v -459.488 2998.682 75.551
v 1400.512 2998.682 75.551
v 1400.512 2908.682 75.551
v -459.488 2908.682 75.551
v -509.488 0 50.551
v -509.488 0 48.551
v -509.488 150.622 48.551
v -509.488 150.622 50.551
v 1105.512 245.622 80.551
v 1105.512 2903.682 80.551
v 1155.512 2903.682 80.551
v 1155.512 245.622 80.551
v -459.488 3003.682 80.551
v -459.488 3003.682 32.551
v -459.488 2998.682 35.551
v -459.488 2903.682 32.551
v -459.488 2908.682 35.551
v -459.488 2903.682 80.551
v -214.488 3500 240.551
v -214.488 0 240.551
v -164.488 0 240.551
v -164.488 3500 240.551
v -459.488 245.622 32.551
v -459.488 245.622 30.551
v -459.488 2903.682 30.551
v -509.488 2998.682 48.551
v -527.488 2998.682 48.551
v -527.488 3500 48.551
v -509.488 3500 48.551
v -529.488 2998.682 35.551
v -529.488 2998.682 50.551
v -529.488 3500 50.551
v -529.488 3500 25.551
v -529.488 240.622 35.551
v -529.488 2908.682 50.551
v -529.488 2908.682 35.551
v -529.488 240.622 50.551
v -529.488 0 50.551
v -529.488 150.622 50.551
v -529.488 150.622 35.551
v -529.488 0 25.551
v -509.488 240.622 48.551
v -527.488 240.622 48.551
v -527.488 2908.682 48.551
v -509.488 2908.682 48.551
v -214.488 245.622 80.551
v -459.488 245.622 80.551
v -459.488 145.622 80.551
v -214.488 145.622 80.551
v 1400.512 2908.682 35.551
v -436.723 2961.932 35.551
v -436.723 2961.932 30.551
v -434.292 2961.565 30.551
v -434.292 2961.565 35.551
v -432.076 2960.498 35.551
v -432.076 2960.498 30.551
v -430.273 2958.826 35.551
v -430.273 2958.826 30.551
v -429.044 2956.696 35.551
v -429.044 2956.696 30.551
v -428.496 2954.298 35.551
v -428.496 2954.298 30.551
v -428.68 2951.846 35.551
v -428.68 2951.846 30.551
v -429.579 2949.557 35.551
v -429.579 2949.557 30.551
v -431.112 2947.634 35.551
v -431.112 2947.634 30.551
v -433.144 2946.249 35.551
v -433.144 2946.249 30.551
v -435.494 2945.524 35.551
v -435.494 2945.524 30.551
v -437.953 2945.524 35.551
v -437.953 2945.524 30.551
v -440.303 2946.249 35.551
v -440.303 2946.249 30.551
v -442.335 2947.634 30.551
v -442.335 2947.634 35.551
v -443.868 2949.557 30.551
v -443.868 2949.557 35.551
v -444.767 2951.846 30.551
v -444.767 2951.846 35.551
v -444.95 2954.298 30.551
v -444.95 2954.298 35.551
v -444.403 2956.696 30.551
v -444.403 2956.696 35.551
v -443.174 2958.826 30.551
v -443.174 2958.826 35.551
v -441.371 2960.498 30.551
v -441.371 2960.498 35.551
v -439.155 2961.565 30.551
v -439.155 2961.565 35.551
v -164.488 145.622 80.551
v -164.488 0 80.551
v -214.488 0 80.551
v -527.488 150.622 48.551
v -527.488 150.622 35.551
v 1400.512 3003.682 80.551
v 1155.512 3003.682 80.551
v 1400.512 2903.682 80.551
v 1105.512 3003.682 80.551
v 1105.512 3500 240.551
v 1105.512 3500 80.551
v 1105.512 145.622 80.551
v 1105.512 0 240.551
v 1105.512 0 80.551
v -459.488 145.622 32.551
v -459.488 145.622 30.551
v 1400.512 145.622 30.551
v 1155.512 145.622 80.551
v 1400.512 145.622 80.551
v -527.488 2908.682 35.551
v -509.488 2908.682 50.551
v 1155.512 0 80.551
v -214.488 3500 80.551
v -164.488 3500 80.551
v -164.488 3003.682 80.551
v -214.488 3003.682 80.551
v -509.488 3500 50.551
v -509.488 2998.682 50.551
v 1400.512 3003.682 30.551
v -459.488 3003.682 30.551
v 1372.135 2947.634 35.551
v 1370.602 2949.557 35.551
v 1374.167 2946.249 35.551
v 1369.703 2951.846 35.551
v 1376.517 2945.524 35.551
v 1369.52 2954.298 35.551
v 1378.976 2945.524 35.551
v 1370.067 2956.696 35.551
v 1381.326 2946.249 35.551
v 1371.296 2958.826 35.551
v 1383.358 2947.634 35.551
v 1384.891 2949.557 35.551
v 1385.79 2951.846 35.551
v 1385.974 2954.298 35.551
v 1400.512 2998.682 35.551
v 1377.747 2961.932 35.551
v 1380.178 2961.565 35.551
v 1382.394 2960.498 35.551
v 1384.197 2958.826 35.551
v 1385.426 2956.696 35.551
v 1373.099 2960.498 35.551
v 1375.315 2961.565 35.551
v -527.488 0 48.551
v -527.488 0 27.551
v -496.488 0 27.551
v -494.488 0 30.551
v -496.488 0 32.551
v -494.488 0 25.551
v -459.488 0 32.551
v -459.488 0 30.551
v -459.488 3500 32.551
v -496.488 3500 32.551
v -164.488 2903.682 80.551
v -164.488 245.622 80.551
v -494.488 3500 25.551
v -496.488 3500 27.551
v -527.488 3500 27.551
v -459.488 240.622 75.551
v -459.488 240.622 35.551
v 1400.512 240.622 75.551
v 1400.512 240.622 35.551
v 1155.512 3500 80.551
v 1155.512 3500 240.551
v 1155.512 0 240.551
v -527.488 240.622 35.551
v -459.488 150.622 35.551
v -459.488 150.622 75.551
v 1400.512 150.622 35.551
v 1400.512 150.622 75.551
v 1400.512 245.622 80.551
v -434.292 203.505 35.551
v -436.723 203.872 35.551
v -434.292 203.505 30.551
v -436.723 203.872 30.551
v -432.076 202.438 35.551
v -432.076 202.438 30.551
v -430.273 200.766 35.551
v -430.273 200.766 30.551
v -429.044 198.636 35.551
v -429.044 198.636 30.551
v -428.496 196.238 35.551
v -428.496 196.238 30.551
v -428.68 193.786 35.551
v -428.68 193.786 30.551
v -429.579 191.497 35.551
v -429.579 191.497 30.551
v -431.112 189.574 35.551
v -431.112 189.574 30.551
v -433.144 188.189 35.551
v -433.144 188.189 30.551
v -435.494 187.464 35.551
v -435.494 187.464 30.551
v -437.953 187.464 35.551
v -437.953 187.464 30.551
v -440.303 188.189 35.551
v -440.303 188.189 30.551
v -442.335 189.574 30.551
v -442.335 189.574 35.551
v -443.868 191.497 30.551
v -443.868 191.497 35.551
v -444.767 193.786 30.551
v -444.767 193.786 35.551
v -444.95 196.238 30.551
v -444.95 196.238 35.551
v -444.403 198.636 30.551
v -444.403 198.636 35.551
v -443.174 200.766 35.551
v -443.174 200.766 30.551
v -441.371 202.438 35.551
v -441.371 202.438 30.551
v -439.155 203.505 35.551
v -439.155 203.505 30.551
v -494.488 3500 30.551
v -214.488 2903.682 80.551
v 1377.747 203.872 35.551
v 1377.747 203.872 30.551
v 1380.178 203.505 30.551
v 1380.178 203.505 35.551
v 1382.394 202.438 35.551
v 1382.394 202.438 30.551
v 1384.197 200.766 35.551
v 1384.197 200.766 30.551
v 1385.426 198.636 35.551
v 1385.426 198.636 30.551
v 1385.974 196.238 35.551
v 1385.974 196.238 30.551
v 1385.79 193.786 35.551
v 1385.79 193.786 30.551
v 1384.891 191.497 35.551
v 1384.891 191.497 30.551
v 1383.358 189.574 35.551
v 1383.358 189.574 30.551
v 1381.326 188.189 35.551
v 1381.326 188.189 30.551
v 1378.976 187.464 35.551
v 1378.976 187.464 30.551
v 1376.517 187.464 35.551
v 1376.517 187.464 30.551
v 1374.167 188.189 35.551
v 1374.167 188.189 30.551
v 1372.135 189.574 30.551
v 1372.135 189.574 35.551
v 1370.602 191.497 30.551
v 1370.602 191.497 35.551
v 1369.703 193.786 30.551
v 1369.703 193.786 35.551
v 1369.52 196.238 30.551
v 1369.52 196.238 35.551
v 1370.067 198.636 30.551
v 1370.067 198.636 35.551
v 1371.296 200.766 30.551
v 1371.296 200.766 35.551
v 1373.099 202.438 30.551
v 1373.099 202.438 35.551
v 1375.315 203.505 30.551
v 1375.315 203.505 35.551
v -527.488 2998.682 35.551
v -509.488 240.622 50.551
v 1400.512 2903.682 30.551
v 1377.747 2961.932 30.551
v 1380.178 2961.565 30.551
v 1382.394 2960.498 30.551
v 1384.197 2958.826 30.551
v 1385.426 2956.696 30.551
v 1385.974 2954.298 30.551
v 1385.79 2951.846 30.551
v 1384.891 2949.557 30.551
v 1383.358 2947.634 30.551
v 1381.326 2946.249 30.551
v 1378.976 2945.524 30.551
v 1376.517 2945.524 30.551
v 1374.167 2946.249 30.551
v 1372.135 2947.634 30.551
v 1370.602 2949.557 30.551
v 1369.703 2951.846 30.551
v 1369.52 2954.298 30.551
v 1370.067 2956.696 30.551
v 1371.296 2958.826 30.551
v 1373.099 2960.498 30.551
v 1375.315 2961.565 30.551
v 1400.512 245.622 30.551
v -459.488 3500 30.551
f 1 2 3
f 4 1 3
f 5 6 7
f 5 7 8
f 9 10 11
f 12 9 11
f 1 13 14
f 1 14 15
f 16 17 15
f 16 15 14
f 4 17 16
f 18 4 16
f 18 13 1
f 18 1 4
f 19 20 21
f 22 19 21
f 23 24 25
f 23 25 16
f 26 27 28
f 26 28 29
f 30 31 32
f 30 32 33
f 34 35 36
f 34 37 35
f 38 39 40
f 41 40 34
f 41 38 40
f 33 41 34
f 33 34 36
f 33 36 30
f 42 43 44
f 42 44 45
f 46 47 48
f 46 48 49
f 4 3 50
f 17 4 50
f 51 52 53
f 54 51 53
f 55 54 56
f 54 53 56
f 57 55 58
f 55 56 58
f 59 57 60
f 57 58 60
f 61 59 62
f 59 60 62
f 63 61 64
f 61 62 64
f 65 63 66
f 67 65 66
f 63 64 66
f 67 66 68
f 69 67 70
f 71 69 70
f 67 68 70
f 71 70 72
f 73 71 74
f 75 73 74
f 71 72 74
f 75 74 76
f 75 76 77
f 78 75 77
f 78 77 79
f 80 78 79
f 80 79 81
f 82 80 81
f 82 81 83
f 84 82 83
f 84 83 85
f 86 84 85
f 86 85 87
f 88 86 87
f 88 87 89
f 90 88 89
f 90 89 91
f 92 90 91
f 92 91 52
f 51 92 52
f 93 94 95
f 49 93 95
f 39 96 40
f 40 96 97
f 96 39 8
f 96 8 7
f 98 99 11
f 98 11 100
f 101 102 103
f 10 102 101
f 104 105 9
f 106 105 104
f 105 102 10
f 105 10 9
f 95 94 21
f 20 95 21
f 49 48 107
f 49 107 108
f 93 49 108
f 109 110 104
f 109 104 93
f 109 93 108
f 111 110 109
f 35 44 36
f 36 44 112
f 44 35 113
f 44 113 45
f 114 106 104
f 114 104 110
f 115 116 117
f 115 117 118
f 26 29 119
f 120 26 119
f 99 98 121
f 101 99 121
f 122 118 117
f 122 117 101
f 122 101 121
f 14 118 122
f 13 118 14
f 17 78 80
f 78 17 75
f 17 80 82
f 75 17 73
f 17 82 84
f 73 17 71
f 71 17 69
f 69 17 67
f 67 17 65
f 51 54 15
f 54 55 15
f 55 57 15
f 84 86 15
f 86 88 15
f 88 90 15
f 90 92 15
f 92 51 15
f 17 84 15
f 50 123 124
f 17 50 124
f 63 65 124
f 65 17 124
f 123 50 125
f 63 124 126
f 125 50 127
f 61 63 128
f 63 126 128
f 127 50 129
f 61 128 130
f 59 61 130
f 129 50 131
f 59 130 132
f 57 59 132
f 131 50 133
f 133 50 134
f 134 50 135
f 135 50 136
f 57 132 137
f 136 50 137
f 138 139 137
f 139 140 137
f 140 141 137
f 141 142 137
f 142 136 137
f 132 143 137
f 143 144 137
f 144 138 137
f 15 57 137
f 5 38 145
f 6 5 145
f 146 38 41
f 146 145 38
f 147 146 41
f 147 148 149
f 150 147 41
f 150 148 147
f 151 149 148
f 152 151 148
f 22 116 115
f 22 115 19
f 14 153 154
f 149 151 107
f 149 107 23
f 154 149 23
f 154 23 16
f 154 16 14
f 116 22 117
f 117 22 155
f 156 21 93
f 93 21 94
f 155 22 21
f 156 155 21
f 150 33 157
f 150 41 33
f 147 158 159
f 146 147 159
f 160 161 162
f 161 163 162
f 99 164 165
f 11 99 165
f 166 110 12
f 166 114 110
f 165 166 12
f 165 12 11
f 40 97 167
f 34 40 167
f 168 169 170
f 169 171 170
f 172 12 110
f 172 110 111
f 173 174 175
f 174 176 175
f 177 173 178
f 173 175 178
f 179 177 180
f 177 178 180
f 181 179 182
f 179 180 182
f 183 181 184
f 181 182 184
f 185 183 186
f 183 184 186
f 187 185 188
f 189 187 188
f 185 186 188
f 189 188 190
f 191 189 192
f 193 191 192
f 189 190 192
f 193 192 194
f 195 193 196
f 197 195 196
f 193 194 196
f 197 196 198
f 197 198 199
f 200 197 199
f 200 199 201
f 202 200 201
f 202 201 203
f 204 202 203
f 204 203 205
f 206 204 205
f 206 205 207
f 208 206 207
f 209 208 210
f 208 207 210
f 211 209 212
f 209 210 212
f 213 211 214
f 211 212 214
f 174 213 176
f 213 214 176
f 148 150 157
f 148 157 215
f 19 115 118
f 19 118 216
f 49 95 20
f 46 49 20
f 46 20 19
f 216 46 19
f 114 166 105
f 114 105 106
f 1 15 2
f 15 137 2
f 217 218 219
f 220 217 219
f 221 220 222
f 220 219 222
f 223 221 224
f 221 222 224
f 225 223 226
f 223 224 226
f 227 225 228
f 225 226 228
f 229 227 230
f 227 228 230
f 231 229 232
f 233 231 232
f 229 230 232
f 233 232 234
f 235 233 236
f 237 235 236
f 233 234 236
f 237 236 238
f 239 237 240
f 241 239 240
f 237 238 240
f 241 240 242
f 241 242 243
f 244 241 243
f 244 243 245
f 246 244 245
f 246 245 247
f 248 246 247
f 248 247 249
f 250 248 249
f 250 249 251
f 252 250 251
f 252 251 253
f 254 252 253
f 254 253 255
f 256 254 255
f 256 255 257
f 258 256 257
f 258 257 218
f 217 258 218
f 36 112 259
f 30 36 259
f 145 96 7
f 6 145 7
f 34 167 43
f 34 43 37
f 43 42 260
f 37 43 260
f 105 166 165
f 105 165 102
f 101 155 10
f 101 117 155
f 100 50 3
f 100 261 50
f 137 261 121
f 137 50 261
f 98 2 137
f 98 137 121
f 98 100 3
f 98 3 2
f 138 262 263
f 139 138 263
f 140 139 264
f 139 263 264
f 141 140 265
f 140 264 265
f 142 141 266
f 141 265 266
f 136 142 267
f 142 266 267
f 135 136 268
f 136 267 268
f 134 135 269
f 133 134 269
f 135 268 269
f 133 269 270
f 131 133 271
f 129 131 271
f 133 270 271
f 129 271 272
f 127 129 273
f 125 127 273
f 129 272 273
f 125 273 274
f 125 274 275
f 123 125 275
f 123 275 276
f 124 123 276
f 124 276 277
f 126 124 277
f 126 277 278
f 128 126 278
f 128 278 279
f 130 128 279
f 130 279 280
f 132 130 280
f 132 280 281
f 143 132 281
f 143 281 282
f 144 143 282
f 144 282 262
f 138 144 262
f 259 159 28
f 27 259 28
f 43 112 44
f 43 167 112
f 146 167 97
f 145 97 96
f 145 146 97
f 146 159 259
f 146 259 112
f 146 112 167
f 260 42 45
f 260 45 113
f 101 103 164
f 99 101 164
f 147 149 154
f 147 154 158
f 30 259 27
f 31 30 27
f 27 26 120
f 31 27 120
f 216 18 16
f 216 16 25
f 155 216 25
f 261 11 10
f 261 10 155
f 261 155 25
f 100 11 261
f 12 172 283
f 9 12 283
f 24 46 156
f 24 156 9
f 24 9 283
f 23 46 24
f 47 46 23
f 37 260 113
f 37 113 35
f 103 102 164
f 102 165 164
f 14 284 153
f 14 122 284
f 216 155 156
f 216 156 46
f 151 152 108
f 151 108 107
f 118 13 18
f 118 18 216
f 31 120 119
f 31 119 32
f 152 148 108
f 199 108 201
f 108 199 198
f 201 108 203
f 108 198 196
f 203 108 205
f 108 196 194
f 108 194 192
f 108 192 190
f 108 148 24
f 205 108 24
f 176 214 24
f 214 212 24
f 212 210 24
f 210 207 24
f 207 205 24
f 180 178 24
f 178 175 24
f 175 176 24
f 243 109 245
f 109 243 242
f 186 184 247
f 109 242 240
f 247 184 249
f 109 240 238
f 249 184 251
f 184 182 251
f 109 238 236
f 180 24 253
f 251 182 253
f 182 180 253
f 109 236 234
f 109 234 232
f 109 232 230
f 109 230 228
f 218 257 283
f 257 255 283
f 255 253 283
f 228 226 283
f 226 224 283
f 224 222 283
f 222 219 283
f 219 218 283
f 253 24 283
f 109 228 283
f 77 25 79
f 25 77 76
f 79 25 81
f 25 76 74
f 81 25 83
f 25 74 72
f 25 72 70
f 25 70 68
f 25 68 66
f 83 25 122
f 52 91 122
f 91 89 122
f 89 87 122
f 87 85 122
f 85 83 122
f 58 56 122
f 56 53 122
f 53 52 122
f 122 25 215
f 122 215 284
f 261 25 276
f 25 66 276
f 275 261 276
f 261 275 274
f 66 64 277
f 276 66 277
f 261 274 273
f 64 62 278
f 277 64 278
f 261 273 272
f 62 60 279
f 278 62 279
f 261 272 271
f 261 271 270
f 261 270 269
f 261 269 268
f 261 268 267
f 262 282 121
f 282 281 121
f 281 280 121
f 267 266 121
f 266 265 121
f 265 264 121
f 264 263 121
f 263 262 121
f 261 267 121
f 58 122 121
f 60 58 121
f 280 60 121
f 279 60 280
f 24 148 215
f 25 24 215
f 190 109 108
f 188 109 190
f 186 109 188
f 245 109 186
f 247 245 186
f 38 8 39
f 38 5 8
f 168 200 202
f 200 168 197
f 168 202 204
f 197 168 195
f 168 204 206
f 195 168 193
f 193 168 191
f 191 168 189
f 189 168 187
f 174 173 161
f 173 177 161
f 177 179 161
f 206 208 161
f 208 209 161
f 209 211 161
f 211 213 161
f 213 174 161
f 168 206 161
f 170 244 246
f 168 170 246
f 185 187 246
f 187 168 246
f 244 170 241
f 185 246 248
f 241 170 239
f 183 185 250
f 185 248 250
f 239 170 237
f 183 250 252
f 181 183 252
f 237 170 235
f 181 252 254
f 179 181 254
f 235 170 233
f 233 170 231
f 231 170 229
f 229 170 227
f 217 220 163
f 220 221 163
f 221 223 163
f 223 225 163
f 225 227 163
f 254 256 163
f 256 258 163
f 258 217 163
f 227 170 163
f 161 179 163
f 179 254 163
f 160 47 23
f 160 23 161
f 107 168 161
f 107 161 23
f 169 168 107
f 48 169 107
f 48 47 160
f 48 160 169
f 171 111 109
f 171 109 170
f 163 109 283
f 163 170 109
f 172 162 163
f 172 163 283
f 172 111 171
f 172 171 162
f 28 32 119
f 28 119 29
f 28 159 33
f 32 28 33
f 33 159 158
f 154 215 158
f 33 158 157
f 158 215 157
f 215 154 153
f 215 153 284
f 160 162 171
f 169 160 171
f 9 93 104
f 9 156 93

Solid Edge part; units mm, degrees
sketch "Sketch1" plane through (0, 0, 0) normal (0, -1, 0) x (1, 0, 0)
  line L0 (-164.4884, 80.5512) -> (-214.4884, 80.5512)
  line L1 (-214.4884, 80.5512) -> (-214.4884, 240.5512)
  line L2 (-214.4884, 240.5512) -> (-164.4884, 240.5512)
  line L3 (-164.4884, 240.5512) -> (-164.4884, 80.5512)
  line L4 (-529.4884, 25.5512) -> (-494.4884, 25.5512)
  line L5 (-494.4884, 25.5512) -> (-494.4884, 30.5512)
  line L6 (-494.4884, 30.5512) -> (-459.4884, 30.5512)
  line L7 (-459.4884, 30.5512) -> (-459.4884, 32.5512)
  line L8 (-459.4884, 32.5512) -> (-496.4884, 32.5512)
  line L9 (-496.4884, 32.5512) -> (-496.4884, 27.5512)
  line L10 (-496.4884, 27.5512) -> (-527.4884, 27.5512)
  line L11 (-527.4884, 27.5512) -> (-527.4884, 48.5512)
  line L12 (-527.4884, 48.5512) -> (-509.4884, 48.5512)
  line L13 (-509.4884, 48.5512) -> (-509.4884, 50.5512)
  line L14 (-509.4884, 50.5512) -> (-529.4884, 50.5512)
  line L15 (-529.4884, 50.5512) -> (-529.4884, 25.5512)
  line L16 (1105.5116, 80.5512) -> (1155.5116, 80.5512)
  line L17 (1155.5116, 80.5512) -> (1155.5116, 240.5512)
  line L18 (1155.5116, 240.5512) -> (1105.5116, 240.5512)
  line L19 (1105.5116, 240.5512) -> (1105.5116, 80.5512)
  dimension "D1" = 160
  dimension "D2" = 50
  dimension "D3" = 160
  dimension "D4" = 50
  dimension "D5" = 1370
  dimension "D6" = 2
  dimension "D7" = 2
  dimension "D8" = 2
  dimension "D9" = 2
  dimension "D10" = 2
  dimension "D11" = 35
  dimension "D12" = 35
  dimension "D13" = 25
  dimension "D14" = 5
  dimension "D15" = 20
  dimension "D16" = 50
  dimension "D17" = 245
extrude "Protrusion1" add sketch "Sketch1" against normal blind 3500
sketch "Sketch2" plane through (-67.4737, 1750, 80.5512) normal (0, 0, -1) x (0, 1, 0)
  line L0 (1153.6818, 1467.9853) -> (1253.6818, 1467.9853)
  line L1 (1253.6818, 1467.9853) -> (1253.6818, -392.0147)
  line L2 (1253.6818, -392.0147) -> (1153.6818, -392.0147)
  line L3 (1153.6818, -392.0147) -> (1153.6818, 1467.9853)
  line L4 (-1604.3782, 1467.9853) -> (-1504.3782, 1467.9853)
  line L5 (-1504.3782, 1467.9853) -> (-1504.3782, -392.0147)
  line L6 (-1504.3782, -392.0147) -> (-1604.3782, -392.0147)
  line L7 (-1604.3782, -392.0147) -> (-1604.3782, 1467.9853)
  dimension "D1" = 1860
  dimension "D2" = 100
  dimension "D3" = 685
  dimension "D4" = 100
  dimension "D5" = 2758.06
extrude "ExtrudedProtrusion_6" add sketch "Sketch2" along normal blind 50
sketch "Sketch3" plane through (1400.5116, 3170.6218, -25) normal (1, 0, 0) x (0, -1, 0)
  line L0 (2930, -60.5512) -> (2930, -100.5512)
  line L1 (2930, -100.5512) -> (3020, -100.5512)
  line L2 (3020, -100.5512) -> (3020, -60.5512)
  line L3 (3020, -60.5512) -> (2930, -60.5512)
  line L4 (171.94, -60.5512) -> (171.94, -100.5512)
  line L5 (171.94, -100.5512) -> (261.94, -100.5512)
  line L6 (261.94, -100.5512) -> (261.94, -60.5512)
  line L7 (261.94, -60.5512) -> (171.94, -60.5512)
  dimension "D1" = 5
  dimension "D2" = 5
  dimension "D3" = 5
  dimension "D4" = 5
  dimension "D5" = 5
  dimension "D6" = 5
  dimension "D7" = 5
  dimension "D8" = 5
extrude "Cutout1" cut sketch "Sketch3" against normal through all
hole "Hole_1" at (1377.7466, 2953.6818, 30.5512) direction (0, 0, 1) diameter 16.5 end up to next
hole "Hole1" at (1377.7466, 195.6218, 30.5512) direction (0, 0, 1) diameter 16.5 end up to next
hole "Hole2" at (-436.7234, 195.6218, 30.5512) direction (0, 0, 1) diameter 16.5 end up to next
hole "Hole3" at (-436.7234, 2953.6818, 30.5512) direction (0, 0, 1) diameter 16.5 end up to next
